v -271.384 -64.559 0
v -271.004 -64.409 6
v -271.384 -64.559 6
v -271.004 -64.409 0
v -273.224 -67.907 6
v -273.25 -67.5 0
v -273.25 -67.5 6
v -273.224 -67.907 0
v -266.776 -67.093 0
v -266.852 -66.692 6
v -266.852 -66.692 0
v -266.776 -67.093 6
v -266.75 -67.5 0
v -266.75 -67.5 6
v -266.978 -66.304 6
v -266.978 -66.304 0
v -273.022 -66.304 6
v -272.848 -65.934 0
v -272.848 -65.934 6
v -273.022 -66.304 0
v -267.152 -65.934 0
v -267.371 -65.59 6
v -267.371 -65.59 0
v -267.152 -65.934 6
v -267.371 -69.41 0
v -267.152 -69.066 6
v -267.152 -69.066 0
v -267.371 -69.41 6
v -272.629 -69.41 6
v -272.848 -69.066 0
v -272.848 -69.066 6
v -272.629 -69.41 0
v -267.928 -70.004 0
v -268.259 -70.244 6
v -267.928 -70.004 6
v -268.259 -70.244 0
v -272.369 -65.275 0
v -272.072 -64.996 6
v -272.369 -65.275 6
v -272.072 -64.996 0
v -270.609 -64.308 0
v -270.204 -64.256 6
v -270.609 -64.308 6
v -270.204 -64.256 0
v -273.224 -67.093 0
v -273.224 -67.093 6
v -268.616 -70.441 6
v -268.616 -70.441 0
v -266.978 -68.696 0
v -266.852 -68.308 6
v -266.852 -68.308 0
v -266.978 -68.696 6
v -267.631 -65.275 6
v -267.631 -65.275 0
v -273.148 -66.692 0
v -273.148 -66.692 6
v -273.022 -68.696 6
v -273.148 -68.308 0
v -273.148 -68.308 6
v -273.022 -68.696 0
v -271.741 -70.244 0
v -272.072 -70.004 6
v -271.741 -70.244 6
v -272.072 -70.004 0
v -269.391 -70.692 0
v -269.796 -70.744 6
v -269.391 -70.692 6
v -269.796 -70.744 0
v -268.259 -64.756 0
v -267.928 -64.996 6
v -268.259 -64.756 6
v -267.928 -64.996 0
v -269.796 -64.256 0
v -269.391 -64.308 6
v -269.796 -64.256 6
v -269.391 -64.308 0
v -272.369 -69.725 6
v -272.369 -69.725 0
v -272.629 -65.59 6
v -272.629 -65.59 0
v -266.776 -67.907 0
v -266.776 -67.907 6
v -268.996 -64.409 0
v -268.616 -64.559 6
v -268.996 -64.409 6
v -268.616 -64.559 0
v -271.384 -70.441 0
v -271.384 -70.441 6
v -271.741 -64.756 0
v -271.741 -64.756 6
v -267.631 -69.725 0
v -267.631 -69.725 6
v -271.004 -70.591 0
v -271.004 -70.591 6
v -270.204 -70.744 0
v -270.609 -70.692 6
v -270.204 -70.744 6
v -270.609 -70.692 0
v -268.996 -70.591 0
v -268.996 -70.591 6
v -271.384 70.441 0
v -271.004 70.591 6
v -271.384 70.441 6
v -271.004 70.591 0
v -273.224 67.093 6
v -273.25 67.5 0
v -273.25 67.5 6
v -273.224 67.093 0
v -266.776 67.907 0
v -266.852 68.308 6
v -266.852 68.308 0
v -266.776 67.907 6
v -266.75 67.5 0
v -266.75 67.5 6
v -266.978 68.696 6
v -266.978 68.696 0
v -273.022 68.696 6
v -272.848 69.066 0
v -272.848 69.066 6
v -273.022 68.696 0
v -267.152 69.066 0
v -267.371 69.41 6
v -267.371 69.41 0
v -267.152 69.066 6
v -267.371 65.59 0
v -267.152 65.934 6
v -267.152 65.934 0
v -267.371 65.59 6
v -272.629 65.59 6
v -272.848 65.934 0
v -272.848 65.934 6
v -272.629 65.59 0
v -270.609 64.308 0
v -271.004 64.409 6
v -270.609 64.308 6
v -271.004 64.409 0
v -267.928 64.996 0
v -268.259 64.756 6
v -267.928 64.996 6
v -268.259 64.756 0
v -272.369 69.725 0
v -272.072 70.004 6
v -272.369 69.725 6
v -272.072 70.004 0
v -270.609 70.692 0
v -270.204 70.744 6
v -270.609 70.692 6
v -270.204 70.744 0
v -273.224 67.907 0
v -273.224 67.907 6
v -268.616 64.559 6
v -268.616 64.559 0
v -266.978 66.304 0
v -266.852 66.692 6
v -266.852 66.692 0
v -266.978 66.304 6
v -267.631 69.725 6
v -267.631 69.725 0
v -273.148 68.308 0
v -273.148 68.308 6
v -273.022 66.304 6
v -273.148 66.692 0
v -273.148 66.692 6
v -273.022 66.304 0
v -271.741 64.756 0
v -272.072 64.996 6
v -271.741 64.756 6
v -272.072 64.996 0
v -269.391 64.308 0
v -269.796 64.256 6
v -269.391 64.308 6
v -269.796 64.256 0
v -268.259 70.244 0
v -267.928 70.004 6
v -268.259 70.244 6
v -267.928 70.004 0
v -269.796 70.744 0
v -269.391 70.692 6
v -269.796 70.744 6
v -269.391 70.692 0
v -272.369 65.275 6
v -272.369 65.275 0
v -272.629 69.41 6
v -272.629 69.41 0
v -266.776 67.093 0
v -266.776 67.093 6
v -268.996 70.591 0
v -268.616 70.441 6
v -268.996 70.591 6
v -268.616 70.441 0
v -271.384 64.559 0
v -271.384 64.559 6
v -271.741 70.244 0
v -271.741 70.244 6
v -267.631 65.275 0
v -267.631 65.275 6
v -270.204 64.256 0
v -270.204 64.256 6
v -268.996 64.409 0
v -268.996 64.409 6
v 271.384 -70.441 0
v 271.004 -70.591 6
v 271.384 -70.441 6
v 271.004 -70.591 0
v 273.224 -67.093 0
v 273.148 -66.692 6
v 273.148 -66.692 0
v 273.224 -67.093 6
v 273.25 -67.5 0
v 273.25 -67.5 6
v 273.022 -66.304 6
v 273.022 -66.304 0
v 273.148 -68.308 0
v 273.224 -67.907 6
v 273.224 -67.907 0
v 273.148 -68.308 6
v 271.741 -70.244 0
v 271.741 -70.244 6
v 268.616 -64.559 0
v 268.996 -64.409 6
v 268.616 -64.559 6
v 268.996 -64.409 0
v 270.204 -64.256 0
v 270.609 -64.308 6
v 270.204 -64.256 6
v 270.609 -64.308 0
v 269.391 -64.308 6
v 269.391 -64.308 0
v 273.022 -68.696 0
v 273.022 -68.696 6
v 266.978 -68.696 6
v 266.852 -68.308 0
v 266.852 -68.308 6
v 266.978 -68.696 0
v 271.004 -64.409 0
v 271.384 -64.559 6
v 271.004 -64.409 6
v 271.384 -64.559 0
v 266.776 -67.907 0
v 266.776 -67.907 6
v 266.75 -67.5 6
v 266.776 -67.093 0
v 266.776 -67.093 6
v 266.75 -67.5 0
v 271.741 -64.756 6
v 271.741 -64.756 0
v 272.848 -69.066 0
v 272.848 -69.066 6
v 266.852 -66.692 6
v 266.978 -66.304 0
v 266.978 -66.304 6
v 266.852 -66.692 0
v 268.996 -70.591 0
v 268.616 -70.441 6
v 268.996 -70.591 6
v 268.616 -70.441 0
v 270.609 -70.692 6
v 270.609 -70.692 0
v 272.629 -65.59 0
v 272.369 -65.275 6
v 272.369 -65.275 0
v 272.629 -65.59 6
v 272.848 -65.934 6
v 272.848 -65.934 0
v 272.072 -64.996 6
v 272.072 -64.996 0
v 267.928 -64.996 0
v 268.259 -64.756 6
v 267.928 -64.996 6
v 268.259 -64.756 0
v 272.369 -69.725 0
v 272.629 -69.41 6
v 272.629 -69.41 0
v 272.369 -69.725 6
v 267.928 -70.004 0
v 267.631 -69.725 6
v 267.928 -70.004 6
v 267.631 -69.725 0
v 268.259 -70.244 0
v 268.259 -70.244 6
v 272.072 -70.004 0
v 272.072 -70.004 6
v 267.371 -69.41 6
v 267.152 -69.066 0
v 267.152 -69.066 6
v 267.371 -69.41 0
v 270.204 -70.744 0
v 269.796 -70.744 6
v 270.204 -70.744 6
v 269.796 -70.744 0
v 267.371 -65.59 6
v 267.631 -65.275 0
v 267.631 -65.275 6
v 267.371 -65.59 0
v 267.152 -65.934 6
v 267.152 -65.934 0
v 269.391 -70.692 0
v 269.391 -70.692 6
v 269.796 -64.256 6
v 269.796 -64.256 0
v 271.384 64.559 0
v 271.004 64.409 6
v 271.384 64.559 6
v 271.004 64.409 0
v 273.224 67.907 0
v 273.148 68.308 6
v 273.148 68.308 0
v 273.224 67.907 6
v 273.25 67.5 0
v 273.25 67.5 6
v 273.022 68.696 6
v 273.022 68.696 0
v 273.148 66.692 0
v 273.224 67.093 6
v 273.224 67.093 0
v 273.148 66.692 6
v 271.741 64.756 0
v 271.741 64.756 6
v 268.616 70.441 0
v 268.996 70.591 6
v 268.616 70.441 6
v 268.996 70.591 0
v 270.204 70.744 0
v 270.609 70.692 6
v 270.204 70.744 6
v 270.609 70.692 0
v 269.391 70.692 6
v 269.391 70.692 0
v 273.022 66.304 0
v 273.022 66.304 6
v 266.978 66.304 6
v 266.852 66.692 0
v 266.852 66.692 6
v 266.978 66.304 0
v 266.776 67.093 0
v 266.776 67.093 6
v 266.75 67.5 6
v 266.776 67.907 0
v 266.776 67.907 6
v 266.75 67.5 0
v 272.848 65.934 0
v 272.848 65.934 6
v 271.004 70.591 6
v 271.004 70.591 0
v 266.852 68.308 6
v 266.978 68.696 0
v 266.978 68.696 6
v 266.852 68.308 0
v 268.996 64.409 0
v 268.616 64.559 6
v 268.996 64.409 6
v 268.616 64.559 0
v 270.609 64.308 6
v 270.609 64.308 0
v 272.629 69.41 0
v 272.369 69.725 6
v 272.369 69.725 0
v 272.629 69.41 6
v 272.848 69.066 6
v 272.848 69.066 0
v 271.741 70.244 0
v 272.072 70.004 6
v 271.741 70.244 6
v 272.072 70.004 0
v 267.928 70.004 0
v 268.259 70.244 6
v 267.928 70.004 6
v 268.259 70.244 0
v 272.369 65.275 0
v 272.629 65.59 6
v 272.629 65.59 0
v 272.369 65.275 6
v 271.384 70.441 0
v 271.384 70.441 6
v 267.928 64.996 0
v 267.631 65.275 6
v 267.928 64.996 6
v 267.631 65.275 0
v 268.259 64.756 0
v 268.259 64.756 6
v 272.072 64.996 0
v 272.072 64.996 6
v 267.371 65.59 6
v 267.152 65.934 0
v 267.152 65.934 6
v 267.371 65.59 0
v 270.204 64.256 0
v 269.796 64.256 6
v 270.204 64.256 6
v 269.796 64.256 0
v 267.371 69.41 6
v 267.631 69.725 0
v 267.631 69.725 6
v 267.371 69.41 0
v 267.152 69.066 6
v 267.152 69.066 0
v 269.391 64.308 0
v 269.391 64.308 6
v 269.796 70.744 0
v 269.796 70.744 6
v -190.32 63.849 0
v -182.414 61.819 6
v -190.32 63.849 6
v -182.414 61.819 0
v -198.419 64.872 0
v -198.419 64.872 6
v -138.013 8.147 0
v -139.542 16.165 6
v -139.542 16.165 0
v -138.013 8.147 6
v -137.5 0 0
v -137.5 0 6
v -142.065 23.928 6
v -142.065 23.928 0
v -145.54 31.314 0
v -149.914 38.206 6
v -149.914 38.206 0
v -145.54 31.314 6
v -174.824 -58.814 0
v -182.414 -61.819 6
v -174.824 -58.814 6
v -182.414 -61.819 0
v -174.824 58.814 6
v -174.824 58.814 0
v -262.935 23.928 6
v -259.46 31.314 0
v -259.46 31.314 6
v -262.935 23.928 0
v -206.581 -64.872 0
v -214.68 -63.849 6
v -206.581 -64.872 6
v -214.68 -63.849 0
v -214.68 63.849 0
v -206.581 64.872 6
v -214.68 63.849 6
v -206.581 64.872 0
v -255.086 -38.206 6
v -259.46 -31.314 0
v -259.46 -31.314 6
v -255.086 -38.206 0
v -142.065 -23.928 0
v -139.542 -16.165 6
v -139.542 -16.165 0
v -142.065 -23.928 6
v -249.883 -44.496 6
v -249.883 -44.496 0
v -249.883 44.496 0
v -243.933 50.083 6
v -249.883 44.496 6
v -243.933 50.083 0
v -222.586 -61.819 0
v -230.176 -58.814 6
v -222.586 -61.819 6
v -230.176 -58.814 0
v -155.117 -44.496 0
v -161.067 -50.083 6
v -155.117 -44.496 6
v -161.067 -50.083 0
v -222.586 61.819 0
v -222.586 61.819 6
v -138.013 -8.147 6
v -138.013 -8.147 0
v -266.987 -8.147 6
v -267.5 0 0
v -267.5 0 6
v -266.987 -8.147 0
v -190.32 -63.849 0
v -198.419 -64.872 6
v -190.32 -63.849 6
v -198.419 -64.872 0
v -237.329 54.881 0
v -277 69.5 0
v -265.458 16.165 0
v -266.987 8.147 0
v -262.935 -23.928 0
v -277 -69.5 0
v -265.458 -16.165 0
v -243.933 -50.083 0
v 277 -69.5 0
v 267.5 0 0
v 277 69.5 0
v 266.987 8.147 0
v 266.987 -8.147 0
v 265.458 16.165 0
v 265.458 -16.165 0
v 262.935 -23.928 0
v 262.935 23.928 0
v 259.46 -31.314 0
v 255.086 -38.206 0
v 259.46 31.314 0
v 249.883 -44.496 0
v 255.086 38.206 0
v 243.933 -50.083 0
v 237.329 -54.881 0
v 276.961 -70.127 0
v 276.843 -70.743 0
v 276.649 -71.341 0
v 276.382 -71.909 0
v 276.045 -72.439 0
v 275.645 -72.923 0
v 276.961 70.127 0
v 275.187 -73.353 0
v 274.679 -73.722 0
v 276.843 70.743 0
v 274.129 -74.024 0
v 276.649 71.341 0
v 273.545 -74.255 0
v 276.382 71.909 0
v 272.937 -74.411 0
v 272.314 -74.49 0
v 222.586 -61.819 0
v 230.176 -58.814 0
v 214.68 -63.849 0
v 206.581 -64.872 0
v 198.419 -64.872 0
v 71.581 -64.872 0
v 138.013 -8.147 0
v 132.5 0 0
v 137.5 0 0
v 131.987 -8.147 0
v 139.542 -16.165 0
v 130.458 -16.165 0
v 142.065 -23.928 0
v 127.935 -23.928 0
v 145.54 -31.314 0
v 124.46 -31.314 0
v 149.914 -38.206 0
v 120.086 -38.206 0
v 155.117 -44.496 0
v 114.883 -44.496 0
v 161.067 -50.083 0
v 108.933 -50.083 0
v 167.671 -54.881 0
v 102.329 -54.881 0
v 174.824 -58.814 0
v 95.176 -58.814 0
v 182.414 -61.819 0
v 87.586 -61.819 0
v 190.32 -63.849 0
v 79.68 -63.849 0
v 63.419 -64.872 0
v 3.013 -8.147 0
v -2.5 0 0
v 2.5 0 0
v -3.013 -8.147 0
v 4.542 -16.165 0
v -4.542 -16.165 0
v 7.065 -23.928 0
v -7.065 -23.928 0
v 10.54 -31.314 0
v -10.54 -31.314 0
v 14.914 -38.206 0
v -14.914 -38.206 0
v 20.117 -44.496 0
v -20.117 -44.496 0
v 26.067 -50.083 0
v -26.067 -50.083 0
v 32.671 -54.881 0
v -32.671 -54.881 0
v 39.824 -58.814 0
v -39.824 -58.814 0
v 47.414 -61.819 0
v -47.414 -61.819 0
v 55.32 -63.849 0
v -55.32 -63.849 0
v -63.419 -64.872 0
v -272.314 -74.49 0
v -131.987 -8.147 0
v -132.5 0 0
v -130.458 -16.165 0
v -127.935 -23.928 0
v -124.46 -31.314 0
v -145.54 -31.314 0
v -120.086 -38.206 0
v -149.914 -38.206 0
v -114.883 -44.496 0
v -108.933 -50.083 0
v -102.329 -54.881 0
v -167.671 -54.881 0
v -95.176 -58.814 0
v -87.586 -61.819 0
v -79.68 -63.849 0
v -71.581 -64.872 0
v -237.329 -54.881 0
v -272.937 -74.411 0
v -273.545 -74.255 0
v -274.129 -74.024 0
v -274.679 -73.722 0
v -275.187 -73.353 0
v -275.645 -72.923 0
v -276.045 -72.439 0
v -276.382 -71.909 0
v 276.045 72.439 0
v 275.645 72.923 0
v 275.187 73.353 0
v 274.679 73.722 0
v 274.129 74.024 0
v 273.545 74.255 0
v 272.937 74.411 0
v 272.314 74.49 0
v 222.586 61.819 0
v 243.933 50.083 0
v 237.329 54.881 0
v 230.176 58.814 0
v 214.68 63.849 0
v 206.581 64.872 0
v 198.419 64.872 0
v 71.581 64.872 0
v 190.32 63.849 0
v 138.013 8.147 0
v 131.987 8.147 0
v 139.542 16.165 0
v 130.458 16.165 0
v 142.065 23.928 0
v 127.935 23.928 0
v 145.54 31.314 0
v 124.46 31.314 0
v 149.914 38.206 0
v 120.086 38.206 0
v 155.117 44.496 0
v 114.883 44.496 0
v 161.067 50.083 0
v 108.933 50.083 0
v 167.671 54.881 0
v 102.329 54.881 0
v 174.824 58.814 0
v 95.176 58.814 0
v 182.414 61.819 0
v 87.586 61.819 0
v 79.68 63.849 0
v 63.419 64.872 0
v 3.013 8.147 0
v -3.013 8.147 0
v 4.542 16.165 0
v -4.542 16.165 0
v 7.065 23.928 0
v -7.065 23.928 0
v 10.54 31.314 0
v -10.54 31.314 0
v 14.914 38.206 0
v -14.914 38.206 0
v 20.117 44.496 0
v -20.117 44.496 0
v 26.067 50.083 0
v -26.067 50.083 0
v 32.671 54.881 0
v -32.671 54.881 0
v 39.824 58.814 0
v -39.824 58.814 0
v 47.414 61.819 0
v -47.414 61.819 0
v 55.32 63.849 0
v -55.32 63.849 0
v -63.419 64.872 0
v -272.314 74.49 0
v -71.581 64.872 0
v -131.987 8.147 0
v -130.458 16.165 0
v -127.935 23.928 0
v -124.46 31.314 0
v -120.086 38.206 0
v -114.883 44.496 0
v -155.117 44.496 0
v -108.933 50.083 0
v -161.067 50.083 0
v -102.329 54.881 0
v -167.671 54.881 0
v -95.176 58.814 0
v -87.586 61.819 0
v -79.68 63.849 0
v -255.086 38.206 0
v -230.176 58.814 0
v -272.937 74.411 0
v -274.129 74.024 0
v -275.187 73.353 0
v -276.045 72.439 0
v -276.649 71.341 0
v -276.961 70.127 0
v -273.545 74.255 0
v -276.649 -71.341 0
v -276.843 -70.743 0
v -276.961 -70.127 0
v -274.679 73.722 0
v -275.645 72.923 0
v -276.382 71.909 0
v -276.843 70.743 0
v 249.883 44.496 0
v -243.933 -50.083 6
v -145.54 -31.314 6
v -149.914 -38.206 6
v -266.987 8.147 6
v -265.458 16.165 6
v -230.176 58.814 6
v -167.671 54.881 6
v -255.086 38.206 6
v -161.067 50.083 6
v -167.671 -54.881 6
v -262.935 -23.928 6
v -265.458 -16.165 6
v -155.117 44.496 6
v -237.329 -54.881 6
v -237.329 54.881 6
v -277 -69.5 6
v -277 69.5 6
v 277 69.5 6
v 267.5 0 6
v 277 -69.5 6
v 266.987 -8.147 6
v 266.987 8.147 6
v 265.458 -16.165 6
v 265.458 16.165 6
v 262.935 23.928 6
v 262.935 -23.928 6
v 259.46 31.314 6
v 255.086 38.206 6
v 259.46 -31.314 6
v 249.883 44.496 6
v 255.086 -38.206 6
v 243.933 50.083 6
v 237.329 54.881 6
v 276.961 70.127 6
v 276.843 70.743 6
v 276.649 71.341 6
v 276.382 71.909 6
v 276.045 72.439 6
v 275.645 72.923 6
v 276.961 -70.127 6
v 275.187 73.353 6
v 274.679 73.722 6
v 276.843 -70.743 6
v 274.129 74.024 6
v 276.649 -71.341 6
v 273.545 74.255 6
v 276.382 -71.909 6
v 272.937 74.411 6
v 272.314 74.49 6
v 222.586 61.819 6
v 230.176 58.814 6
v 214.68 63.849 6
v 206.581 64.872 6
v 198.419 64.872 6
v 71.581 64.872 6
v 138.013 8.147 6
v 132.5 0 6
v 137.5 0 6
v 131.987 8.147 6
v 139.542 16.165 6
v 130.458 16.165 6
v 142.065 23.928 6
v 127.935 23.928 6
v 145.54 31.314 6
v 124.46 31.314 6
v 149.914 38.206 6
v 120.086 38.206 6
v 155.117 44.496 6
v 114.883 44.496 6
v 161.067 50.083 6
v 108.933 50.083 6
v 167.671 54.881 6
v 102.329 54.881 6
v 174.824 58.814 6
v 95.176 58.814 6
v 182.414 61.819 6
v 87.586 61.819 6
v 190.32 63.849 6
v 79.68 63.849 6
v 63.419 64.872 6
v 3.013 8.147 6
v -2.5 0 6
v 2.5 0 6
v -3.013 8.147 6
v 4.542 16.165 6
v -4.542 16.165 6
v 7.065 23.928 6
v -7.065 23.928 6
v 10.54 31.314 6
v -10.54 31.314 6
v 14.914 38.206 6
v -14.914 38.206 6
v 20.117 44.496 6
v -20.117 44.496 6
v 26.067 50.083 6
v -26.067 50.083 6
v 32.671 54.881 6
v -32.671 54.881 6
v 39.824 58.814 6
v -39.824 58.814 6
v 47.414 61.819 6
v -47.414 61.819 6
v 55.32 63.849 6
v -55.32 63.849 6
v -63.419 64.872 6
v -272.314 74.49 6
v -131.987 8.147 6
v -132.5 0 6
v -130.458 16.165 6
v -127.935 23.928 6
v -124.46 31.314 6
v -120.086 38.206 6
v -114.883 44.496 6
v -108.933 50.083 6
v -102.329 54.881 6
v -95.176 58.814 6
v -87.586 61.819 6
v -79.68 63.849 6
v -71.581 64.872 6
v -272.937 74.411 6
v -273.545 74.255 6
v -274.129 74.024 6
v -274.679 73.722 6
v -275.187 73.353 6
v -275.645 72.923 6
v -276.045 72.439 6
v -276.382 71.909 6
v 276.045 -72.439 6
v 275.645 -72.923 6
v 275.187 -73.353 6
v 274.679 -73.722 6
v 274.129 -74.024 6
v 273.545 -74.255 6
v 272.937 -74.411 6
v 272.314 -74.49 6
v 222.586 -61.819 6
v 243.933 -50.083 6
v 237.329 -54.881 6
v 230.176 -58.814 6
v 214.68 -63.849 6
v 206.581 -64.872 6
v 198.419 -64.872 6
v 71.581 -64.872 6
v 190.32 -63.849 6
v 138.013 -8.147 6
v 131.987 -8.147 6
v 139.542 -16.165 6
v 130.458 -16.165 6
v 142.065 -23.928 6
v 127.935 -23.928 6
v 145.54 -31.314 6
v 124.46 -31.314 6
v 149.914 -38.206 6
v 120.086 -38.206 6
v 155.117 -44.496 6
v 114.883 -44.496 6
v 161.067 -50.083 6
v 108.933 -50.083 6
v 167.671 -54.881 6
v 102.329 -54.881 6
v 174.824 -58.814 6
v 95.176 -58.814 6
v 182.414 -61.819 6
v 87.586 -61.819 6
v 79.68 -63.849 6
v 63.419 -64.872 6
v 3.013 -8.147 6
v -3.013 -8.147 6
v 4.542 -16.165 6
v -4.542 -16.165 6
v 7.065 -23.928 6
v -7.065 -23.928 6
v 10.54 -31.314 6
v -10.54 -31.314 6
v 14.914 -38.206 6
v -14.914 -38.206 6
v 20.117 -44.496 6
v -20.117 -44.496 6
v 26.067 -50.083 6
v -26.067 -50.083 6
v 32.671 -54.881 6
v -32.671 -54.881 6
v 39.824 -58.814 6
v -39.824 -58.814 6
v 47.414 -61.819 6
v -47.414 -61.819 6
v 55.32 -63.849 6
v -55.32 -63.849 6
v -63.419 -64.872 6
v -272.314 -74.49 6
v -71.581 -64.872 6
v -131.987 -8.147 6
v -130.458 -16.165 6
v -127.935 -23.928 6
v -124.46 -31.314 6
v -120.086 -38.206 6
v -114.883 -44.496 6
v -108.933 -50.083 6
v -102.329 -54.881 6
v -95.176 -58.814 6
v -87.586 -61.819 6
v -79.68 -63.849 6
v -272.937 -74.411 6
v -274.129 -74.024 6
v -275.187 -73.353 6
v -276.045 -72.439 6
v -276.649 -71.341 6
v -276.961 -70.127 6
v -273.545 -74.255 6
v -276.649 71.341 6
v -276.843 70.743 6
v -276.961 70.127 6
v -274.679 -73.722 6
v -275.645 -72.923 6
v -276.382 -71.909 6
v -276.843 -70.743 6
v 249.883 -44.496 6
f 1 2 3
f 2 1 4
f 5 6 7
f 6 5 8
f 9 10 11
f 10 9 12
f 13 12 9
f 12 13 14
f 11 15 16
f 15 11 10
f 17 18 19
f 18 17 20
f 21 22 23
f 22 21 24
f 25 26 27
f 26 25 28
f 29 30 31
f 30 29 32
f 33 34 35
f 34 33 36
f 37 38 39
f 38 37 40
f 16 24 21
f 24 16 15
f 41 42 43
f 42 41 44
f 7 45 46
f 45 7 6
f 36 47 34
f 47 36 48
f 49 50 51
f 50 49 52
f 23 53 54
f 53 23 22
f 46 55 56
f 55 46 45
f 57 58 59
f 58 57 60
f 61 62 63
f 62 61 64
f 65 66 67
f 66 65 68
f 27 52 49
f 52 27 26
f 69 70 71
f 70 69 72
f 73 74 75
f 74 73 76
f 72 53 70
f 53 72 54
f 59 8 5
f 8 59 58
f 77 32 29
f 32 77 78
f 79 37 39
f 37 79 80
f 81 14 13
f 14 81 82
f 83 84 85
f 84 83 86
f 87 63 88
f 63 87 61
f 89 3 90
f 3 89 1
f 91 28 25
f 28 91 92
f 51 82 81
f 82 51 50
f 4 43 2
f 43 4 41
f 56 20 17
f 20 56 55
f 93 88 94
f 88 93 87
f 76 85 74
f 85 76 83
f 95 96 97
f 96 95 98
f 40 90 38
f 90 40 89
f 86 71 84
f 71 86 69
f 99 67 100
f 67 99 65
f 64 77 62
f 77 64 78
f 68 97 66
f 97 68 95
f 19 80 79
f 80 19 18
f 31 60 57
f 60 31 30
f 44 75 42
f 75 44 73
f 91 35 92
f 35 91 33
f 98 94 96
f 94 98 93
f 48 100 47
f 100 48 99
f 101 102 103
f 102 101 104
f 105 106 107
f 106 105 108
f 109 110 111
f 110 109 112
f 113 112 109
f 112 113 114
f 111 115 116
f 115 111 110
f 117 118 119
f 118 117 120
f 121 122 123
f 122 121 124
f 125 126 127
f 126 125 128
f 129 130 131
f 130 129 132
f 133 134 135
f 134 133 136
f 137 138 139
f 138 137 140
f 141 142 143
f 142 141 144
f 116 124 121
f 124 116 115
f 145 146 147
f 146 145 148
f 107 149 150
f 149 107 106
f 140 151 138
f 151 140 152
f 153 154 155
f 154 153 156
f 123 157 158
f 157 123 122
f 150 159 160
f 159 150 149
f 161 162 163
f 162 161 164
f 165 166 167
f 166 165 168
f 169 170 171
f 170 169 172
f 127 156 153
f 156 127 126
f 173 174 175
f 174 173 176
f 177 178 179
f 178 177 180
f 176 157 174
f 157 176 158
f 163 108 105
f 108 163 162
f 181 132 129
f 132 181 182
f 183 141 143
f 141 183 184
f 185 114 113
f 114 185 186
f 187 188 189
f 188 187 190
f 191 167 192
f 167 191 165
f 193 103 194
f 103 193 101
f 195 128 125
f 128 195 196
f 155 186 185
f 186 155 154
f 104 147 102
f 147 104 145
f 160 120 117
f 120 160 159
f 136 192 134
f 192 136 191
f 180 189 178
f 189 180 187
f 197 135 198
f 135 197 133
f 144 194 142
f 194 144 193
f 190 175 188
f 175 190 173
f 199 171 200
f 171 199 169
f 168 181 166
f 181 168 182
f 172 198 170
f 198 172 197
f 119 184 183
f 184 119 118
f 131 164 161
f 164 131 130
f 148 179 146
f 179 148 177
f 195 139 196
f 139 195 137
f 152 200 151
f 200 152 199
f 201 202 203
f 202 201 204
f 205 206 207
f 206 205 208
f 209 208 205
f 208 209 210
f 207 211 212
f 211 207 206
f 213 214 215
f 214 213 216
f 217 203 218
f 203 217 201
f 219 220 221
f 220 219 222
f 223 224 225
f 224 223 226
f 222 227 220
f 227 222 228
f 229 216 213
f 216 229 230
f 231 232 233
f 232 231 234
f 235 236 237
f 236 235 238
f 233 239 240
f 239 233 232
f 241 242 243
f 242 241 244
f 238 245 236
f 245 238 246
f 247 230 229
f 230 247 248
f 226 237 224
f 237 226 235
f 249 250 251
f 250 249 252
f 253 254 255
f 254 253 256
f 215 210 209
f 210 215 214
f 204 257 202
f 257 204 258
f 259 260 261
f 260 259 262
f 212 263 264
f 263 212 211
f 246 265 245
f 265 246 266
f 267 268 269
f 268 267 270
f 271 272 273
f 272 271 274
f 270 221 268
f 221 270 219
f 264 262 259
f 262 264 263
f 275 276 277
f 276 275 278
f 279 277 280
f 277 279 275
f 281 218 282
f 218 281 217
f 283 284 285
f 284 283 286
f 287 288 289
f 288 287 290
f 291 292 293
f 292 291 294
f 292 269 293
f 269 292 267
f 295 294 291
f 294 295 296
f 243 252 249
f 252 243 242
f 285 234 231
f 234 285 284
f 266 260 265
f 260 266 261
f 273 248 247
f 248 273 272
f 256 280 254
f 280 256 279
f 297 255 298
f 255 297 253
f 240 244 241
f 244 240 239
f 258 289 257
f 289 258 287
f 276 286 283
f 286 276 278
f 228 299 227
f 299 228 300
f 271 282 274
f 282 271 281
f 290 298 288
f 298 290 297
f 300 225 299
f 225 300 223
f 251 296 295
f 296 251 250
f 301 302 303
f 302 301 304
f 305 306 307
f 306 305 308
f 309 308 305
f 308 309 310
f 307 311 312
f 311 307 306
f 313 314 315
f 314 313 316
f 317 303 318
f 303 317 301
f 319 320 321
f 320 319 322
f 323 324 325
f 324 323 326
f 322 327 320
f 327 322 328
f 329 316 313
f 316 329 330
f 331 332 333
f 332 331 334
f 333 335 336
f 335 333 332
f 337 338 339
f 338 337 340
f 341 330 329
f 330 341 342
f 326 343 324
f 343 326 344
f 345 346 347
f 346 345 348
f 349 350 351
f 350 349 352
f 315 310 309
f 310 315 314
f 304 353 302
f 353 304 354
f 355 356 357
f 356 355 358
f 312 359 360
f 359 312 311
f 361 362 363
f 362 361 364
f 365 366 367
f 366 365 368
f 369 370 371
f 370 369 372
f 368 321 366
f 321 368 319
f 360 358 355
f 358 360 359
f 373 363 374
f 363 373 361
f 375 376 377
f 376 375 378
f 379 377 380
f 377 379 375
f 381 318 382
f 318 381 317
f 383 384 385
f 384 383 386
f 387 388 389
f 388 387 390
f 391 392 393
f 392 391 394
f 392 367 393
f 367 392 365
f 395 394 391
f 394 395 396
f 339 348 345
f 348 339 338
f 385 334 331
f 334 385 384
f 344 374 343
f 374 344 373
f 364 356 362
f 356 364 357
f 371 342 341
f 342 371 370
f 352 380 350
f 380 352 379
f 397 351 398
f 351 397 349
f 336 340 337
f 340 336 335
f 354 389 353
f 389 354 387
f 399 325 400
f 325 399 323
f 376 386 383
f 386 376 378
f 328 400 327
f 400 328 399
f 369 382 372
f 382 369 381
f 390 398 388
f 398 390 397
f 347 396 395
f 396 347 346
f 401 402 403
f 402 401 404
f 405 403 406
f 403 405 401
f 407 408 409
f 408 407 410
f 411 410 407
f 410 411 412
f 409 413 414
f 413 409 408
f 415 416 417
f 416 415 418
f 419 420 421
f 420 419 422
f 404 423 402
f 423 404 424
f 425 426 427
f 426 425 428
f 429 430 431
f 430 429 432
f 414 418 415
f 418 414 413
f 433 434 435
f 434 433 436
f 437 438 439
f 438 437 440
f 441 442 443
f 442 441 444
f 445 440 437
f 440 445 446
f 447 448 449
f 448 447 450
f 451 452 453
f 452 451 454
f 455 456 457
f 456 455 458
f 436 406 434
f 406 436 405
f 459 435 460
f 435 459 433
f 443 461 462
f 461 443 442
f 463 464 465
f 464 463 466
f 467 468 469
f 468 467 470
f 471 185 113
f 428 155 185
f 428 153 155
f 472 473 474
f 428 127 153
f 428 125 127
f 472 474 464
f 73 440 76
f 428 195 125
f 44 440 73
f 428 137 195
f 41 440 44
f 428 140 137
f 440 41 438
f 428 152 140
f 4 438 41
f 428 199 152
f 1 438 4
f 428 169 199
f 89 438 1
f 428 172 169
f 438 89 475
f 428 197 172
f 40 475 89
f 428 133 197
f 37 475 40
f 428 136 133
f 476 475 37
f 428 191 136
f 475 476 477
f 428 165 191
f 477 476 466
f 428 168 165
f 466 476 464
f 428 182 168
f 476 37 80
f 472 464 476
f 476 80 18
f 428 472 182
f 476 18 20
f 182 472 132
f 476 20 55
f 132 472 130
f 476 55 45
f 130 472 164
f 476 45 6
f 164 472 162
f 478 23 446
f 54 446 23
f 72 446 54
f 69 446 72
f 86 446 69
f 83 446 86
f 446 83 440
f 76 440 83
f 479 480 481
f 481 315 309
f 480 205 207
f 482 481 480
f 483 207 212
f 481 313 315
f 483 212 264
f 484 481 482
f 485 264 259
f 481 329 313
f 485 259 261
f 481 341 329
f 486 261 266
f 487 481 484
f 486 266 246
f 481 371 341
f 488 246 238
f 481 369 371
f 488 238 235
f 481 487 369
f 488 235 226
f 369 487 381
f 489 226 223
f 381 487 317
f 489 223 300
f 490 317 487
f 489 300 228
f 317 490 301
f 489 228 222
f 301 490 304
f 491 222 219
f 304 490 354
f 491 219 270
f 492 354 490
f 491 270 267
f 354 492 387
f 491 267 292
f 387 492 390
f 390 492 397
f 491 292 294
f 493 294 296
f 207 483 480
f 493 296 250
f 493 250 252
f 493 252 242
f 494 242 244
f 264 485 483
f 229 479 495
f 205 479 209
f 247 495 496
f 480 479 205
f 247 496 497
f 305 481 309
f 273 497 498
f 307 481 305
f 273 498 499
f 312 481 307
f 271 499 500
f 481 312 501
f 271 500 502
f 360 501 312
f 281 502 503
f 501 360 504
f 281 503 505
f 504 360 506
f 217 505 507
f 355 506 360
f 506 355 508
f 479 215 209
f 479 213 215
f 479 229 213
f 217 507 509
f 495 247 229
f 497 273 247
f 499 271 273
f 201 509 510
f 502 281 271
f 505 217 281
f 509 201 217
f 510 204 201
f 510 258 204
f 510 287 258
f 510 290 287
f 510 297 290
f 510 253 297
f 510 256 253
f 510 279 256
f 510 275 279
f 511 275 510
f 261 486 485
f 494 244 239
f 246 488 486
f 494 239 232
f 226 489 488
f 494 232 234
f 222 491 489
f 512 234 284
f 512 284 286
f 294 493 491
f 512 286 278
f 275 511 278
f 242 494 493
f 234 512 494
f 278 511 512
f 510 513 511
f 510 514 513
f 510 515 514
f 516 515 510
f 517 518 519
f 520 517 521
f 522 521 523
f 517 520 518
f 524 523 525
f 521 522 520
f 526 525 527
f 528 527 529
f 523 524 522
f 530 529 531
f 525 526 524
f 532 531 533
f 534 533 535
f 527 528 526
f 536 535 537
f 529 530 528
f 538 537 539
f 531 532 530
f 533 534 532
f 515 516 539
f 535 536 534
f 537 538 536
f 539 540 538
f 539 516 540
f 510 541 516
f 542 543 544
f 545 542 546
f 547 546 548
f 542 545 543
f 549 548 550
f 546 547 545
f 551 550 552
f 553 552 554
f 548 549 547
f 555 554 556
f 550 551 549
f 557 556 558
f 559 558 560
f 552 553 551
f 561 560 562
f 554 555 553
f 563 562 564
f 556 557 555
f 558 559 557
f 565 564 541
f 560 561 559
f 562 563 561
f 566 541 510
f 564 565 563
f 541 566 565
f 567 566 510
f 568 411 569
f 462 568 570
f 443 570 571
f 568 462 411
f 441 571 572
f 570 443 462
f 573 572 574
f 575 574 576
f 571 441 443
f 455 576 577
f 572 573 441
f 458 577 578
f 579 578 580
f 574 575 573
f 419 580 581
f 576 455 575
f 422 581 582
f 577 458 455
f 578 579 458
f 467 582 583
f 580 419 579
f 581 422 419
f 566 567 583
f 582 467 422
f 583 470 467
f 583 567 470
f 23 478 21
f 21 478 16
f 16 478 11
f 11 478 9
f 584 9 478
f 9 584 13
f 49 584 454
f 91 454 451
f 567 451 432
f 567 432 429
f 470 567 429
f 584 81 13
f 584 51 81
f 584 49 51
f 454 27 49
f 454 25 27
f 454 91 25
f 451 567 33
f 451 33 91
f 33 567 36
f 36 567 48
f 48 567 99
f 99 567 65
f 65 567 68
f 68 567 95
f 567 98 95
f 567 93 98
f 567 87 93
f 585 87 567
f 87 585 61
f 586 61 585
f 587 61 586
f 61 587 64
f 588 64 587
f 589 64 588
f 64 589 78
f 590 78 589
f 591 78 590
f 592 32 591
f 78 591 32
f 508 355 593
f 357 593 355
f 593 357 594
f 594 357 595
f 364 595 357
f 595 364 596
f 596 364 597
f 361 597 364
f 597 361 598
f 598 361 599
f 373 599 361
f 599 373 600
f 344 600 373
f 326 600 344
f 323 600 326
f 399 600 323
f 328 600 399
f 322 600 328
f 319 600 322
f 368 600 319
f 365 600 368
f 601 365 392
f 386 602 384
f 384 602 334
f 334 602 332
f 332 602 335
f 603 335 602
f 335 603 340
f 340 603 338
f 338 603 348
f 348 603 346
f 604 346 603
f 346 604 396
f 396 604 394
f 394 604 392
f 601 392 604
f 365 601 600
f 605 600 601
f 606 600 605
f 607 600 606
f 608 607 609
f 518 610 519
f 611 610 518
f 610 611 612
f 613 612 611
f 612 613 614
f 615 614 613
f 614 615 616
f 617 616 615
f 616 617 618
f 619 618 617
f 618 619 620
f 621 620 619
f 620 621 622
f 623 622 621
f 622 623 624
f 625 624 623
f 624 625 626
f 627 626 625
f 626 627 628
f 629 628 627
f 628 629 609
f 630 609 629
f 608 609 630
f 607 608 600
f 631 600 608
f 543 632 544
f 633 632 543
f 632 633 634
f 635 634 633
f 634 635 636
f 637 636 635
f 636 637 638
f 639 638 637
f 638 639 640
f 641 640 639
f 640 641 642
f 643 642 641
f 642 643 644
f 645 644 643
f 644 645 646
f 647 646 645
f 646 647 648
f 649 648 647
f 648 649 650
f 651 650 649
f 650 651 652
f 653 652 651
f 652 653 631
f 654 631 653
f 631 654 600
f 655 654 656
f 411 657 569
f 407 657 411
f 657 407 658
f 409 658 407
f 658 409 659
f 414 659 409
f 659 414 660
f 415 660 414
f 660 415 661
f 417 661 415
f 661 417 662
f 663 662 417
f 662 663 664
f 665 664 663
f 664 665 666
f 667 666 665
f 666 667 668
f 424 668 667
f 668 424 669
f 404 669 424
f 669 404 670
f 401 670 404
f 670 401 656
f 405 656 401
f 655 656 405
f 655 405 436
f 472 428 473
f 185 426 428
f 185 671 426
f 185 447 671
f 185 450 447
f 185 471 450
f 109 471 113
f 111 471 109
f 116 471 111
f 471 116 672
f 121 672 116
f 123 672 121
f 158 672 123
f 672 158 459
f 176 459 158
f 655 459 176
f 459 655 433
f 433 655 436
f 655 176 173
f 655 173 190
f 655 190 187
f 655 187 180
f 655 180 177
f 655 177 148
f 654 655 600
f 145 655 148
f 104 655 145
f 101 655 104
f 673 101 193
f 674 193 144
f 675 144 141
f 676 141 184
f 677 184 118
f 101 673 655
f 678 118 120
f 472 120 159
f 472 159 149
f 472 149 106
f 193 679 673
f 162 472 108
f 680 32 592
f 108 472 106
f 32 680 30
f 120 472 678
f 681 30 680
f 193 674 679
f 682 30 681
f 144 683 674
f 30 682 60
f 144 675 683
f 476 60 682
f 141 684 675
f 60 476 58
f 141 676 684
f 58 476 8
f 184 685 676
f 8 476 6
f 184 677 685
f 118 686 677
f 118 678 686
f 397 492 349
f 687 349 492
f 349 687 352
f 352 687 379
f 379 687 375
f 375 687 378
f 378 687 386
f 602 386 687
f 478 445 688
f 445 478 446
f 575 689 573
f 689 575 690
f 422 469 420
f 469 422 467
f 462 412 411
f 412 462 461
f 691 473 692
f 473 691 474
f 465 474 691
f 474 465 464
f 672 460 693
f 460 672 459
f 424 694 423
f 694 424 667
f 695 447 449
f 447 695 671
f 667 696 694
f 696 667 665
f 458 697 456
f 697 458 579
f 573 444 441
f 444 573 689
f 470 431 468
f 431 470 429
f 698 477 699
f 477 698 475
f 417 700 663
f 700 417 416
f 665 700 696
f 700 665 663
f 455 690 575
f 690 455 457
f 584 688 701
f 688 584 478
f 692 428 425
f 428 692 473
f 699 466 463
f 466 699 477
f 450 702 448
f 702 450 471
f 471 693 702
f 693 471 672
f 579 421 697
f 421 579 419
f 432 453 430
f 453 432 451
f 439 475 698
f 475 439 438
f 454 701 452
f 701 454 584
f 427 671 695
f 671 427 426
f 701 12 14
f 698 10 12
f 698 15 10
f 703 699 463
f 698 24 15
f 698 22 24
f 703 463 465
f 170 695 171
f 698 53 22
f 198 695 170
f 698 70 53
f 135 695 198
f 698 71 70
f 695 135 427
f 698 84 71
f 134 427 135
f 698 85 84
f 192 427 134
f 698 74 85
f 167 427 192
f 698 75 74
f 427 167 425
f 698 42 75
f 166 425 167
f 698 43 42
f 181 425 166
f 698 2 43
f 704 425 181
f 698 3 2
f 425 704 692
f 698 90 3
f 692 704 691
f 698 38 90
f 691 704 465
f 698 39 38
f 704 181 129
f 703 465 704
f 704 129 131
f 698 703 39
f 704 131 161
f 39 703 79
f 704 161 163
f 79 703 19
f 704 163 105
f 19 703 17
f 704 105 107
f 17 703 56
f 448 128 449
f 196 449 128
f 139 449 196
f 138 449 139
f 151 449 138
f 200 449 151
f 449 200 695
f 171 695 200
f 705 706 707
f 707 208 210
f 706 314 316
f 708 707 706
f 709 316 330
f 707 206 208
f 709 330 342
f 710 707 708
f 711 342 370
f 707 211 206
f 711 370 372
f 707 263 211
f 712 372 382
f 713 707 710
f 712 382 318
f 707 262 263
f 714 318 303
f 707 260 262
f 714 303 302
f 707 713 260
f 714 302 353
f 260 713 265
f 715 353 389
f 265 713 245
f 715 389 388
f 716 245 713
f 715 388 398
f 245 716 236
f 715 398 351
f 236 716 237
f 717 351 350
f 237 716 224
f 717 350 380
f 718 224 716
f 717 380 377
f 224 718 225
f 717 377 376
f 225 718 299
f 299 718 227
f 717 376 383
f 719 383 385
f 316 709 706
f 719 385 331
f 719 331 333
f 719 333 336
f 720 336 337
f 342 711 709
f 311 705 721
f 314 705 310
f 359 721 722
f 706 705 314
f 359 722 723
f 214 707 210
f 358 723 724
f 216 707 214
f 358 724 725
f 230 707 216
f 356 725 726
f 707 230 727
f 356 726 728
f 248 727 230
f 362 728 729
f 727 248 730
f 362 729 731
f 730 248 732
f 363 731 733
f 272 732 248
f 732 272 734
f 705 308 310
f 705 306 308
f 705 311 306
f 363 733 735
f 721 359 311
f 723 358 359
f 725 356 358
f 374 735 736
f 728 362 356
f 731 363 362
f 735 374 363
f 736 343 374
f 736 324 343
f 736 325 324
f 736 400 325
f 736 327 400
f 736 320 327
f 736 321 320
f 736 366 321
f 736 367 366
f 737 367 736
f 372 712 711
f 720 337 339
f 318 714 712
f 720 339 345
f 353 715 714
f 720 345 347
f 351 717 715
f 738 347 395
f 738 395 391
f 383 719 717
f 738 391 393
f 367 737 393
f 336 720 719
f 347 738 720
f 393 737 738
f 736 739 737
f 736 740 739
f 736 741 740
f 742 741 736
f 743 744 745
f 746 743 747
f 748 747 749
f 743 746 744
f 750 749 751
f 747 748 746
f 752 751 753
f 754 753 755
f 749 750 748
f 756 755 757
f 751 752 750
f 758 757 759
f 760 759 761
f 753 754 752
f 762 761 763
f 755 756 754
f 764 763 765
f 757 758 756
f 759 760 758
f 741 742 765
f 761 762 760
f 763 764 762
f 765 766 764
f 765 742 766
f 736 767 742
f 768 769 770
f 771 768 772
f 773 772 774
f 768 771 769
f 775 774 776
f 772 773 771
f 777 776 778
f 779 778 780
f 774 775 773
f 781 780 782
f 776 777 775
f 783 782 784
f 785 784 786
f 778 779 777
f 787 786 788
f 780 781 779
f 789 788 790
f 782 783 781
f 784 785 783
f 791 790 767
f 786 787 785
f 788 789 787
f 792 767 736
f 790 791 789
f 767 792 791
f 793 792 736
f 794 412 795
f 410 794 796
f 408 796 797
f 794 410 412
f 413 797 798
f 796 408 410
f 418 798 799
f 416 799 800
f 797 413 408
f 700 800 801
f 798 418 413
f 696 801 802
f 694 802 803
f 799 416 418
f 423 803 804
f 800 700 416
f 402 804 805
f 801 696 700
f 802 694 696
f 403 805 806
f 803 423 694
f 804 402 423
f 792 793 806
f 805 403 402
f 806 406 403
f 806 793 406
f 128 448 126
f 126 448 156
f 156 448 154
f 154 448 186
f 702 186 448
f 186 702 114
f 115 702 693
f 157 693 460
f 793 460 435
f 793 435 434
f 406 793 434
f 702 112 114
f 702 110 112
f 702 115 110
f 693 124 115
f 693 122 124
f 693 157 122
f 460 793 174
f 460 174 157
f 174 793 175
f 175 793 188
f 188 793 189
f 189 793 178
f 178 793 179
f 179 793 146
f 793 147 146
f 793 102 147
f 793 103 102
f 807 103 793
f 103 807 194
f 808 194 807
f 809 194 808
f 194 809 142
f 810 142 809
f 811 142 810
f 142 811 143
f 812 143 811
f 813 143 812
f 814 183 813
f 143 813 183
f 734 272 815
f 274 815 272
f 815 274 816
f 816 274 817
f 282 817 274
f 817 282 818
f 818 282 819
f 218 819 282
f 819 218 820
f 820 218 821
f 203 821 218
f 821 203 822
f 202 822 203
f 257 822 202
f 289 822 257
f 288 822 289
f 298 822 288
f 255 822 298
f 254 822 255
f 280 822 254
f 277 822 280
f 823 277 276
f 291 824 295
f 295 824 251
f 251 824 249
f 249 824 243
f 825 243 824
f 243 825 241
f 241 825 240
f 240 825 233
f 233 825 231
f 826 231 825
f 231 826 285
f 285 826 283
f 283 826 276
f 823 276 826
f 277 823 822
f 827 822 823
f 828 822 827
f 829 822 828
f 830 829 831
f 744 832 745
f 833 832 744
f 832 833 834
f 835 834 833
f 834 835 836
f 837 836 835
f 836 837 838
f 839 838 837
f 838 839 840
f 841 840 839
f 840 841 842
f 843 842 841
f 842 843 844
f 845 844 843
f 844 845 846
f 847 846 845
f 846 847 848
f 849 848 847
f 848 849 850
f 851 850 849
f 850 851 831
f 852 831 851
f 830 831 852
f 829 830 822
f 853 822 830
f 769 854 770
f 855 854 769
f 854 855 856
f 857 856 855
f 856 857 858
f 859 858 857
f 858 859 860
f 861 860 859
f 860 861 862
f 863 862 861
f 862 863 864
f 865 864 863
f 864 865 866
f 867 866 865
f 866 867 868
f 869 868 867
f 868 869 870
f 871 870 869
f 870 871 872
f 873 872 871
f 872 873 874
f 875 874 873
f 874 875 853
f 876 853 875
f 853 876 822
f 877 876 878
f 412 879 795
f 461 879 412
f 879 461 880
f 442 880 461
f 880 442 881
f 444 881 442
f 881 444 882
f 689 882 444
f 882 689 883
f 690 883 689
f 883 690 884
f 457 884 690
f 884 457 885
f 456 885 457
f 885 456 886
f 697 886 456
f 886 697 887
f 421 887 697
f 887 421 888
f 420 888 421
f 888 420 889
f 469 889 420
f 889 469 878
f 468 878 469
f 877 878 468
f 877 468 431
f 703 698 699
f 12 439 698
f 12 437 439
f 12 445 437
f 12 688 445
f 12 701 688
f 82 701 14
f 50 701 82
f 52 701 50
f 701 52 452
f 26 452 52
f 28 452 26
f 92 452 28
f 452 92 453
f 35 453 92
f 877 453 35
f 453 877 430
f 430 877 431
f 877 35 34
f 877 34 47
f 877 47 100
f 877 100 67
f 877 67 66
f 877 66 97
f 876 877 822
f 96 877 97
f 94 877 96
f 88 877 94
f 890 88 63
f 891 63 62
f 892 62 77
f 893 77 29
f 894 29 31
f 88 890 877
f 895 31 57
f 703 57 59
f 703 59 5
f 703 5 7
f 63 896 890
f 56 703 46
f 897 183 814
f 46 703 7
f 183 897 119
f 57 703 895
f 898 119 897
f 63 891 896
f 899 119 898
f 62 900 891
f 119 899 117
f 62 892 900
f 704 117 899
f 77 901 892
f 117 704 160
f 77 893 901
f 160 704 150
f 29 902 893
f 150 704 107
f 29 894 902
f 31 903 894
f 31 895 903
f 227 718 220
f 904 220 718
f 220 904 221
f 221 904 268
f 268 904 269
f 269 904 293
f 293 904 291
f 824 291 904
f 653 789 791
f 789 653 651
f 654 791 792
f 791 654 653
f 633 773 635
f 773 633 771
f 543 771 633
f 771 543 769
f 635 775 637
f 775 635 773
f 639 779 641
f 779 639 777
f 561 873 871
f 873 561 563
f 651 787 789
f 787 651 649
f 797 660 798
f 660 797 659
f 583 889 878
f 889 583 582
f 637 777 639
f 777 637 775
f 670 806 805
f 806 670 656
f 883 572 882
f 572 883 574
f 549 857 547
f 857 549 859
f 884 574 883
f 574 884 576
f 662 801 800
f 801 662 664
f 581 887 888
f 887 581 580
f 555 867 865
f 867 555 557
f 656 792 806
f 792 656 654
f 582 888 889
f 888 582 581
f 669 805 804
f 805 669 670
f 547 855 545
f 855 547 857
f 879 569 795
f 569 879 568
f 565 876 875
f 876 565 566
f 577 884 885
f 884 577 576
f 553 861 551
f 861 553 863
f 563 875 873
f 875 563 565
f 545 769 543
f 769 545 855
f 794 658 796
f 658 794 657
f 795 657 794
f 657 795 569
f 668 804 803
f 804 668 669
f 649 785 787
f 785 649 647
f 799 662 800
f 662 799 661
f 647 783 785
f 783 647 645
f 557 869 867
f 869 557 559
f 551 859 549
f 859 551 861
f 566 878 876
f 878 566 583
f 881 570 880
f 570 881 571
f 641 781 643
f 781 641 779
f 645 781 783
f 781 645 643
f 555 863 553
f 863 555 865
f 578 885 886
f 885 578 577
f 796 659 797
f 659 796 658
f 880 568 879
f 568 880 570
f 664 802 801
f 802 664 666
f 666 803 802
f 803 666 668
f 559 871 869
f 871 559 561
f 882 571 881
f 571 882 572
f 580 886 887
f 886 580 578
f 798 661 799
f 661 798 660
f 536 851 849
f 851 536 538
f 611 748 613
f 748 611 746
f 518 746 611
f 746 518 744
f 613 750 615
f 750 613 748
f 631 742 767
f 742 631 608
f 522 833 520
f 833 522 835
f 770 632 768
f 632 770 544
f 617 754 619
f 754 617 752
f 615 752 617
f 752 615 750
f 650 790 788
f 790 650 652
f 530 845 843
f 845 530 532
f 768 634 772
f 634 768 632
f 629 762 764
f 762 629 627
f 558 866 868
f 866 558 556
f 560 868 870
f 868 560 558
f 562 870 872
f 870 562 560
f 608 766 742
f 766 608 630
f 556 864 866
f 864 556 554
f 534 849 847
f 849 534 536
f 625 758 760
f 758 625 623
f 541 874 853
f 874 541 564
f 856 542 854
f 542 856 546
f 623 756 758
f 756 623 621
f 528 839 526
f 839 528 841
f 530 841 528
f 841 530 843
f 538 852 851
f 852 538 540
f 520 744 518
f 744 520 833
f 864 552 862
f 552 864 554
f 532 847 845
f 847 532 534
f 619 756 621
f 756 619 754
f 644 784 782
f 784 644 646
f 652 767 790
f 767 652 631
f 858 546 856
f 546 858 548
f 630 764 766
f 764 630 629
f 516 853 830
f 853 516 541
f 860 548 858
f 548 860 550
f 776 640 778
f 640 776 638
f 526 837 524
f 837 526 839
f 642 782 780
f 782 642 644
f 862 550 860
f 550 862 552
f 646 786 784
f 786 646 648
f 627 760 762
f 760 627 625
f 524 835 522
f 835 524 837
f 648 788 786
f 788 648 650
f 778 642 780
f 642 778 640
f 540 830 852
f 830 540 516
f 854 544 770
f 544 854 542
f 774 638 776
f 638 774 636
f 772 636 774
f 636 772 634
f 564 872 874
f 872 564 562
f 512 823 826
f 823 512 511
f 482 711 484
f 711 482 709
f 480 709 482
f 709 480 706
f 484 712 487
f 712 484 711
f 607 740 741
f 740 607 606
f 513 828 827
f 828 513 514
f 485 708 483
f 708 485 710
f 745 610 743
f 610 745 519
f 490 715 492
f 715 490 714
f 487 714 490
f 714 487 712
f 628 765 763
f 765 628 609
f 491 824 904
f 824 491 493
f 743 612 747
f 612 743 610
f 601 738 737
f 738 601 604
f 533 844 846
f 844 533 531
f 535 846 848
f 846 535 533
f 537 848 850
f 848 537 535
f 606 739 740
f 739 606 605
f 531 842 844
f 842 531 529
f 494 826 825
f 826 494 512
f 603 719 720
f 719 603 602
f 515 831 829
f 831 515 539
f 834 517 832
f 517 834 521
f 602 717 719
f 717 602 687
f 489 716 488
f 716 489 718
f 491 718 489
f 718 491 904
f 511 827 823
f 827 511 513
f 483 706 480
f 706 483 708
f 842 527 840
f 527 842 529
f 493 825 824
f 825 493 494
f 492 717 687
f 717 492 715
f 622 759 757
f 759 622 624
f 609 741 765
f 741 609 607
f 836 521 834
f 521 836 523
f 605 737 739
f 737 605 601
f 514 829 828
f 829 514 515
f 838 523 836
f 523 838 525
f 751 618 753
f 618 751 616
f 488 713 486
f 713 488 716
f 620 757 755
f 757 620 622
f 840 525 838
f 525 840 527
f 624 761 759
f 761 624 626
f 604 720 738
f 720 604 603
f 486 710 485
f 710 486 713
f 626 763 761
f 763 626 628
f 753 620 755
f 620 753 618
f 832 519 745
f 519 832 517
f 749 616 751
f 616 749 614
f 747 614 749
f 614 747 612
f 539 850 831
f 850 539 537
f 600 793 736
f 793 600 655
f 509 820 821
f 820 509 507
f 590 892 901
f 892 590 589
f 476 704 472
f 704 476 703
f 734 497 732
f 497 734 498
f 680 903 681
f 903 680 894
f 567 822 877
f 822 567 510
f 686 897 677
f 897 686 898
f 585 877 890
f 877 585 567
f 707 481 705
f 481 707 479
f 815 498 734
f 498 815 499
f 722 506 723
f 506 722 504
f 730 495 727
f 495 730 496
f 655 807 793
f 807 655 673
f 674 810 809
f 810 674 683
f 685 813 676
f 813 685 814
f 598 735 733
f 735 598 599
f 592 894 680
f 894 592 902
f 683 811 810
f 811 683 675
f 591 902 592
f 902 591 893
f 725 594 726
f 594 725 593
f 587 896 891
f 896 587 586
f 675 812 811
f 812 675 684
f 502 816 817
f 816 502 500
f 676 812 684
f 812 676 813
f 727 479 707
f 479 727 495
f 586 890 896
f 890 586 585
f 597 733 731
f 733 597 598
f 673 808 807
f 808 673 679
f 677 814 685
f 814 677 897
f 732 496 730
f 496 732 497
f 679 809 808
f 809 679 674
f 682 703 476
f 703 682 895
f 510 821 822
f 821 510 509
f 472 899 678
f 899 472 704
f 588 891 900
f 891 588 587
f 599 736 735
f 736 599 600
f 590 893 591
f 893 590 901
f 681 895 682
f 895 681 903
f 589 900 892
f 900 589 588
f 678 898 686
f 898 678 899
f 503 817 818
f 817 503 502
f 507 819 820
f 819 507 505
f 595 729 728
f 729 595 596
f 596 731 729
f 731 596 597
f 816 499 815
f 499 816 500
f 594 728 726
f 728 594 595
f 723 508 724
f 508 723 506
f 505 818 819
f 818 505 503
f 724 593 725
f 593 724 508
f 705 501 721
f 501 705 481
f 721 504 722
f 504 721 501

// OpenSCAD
$fn = 50;


difference() {
	union() {
		hull() {
			translate(v = [-272.0000000000, 69.5000000000, 0]) {
				cylinder(h = 6, r = 5);
			}
			translate(v = [272.0000000000, 69.5000000000, 0]) {
				cylinder(h = 6, r = 5);
			}
			translate(v = [-272.0000000000, -69.5000000000, 0]) {
				cylinder(h = 6, r = 5);
			}
			translate(v = [272.0000000000, -69.5000000000, 0]) {
				cylinder(h = 6, r = 5);
			}
		}
	}
	union() {
		#translate(v = [-270.0000000000, -67.5000000000, -100.0000000000]) {
			cylinder(h = 200, r = 3.2500000000);
		}
		#translate(v = [-270.0000000000, 67.5000000000, -100.0000000000]) {
			cylinder(h = 200, r = 3.2500000000);
		}
		#translate(v = [270.0000000000, -67.5000000000, -100.0000000000]) {
			cylinder(h = 200, r = 3.2500000000);
		}
		#translate(v = [270.0000000000, 67.5000000000, -100.0000000000]) {
			cylinder(h = 200, r = 3.2500000000);
		}
		#translate(v = [-202.5000000000, 0, 0]) {
			cylinder(h = 6, r = 65.0000000000);
		}
		#translate(v = [-67.5000000000, 0, 0]) {
			cylinder(h = 6, r = 65.0000000000);
		}
		#translate(v = [67.5000000000, 0, 0]) {
			cylinder(h = 6, r = 65.0000000000);
		}
		#translate(v = [202.5000000000, 0, 0]) {
			cylinder(h = 6, r = 65.0000000000);
		}
	}
}
